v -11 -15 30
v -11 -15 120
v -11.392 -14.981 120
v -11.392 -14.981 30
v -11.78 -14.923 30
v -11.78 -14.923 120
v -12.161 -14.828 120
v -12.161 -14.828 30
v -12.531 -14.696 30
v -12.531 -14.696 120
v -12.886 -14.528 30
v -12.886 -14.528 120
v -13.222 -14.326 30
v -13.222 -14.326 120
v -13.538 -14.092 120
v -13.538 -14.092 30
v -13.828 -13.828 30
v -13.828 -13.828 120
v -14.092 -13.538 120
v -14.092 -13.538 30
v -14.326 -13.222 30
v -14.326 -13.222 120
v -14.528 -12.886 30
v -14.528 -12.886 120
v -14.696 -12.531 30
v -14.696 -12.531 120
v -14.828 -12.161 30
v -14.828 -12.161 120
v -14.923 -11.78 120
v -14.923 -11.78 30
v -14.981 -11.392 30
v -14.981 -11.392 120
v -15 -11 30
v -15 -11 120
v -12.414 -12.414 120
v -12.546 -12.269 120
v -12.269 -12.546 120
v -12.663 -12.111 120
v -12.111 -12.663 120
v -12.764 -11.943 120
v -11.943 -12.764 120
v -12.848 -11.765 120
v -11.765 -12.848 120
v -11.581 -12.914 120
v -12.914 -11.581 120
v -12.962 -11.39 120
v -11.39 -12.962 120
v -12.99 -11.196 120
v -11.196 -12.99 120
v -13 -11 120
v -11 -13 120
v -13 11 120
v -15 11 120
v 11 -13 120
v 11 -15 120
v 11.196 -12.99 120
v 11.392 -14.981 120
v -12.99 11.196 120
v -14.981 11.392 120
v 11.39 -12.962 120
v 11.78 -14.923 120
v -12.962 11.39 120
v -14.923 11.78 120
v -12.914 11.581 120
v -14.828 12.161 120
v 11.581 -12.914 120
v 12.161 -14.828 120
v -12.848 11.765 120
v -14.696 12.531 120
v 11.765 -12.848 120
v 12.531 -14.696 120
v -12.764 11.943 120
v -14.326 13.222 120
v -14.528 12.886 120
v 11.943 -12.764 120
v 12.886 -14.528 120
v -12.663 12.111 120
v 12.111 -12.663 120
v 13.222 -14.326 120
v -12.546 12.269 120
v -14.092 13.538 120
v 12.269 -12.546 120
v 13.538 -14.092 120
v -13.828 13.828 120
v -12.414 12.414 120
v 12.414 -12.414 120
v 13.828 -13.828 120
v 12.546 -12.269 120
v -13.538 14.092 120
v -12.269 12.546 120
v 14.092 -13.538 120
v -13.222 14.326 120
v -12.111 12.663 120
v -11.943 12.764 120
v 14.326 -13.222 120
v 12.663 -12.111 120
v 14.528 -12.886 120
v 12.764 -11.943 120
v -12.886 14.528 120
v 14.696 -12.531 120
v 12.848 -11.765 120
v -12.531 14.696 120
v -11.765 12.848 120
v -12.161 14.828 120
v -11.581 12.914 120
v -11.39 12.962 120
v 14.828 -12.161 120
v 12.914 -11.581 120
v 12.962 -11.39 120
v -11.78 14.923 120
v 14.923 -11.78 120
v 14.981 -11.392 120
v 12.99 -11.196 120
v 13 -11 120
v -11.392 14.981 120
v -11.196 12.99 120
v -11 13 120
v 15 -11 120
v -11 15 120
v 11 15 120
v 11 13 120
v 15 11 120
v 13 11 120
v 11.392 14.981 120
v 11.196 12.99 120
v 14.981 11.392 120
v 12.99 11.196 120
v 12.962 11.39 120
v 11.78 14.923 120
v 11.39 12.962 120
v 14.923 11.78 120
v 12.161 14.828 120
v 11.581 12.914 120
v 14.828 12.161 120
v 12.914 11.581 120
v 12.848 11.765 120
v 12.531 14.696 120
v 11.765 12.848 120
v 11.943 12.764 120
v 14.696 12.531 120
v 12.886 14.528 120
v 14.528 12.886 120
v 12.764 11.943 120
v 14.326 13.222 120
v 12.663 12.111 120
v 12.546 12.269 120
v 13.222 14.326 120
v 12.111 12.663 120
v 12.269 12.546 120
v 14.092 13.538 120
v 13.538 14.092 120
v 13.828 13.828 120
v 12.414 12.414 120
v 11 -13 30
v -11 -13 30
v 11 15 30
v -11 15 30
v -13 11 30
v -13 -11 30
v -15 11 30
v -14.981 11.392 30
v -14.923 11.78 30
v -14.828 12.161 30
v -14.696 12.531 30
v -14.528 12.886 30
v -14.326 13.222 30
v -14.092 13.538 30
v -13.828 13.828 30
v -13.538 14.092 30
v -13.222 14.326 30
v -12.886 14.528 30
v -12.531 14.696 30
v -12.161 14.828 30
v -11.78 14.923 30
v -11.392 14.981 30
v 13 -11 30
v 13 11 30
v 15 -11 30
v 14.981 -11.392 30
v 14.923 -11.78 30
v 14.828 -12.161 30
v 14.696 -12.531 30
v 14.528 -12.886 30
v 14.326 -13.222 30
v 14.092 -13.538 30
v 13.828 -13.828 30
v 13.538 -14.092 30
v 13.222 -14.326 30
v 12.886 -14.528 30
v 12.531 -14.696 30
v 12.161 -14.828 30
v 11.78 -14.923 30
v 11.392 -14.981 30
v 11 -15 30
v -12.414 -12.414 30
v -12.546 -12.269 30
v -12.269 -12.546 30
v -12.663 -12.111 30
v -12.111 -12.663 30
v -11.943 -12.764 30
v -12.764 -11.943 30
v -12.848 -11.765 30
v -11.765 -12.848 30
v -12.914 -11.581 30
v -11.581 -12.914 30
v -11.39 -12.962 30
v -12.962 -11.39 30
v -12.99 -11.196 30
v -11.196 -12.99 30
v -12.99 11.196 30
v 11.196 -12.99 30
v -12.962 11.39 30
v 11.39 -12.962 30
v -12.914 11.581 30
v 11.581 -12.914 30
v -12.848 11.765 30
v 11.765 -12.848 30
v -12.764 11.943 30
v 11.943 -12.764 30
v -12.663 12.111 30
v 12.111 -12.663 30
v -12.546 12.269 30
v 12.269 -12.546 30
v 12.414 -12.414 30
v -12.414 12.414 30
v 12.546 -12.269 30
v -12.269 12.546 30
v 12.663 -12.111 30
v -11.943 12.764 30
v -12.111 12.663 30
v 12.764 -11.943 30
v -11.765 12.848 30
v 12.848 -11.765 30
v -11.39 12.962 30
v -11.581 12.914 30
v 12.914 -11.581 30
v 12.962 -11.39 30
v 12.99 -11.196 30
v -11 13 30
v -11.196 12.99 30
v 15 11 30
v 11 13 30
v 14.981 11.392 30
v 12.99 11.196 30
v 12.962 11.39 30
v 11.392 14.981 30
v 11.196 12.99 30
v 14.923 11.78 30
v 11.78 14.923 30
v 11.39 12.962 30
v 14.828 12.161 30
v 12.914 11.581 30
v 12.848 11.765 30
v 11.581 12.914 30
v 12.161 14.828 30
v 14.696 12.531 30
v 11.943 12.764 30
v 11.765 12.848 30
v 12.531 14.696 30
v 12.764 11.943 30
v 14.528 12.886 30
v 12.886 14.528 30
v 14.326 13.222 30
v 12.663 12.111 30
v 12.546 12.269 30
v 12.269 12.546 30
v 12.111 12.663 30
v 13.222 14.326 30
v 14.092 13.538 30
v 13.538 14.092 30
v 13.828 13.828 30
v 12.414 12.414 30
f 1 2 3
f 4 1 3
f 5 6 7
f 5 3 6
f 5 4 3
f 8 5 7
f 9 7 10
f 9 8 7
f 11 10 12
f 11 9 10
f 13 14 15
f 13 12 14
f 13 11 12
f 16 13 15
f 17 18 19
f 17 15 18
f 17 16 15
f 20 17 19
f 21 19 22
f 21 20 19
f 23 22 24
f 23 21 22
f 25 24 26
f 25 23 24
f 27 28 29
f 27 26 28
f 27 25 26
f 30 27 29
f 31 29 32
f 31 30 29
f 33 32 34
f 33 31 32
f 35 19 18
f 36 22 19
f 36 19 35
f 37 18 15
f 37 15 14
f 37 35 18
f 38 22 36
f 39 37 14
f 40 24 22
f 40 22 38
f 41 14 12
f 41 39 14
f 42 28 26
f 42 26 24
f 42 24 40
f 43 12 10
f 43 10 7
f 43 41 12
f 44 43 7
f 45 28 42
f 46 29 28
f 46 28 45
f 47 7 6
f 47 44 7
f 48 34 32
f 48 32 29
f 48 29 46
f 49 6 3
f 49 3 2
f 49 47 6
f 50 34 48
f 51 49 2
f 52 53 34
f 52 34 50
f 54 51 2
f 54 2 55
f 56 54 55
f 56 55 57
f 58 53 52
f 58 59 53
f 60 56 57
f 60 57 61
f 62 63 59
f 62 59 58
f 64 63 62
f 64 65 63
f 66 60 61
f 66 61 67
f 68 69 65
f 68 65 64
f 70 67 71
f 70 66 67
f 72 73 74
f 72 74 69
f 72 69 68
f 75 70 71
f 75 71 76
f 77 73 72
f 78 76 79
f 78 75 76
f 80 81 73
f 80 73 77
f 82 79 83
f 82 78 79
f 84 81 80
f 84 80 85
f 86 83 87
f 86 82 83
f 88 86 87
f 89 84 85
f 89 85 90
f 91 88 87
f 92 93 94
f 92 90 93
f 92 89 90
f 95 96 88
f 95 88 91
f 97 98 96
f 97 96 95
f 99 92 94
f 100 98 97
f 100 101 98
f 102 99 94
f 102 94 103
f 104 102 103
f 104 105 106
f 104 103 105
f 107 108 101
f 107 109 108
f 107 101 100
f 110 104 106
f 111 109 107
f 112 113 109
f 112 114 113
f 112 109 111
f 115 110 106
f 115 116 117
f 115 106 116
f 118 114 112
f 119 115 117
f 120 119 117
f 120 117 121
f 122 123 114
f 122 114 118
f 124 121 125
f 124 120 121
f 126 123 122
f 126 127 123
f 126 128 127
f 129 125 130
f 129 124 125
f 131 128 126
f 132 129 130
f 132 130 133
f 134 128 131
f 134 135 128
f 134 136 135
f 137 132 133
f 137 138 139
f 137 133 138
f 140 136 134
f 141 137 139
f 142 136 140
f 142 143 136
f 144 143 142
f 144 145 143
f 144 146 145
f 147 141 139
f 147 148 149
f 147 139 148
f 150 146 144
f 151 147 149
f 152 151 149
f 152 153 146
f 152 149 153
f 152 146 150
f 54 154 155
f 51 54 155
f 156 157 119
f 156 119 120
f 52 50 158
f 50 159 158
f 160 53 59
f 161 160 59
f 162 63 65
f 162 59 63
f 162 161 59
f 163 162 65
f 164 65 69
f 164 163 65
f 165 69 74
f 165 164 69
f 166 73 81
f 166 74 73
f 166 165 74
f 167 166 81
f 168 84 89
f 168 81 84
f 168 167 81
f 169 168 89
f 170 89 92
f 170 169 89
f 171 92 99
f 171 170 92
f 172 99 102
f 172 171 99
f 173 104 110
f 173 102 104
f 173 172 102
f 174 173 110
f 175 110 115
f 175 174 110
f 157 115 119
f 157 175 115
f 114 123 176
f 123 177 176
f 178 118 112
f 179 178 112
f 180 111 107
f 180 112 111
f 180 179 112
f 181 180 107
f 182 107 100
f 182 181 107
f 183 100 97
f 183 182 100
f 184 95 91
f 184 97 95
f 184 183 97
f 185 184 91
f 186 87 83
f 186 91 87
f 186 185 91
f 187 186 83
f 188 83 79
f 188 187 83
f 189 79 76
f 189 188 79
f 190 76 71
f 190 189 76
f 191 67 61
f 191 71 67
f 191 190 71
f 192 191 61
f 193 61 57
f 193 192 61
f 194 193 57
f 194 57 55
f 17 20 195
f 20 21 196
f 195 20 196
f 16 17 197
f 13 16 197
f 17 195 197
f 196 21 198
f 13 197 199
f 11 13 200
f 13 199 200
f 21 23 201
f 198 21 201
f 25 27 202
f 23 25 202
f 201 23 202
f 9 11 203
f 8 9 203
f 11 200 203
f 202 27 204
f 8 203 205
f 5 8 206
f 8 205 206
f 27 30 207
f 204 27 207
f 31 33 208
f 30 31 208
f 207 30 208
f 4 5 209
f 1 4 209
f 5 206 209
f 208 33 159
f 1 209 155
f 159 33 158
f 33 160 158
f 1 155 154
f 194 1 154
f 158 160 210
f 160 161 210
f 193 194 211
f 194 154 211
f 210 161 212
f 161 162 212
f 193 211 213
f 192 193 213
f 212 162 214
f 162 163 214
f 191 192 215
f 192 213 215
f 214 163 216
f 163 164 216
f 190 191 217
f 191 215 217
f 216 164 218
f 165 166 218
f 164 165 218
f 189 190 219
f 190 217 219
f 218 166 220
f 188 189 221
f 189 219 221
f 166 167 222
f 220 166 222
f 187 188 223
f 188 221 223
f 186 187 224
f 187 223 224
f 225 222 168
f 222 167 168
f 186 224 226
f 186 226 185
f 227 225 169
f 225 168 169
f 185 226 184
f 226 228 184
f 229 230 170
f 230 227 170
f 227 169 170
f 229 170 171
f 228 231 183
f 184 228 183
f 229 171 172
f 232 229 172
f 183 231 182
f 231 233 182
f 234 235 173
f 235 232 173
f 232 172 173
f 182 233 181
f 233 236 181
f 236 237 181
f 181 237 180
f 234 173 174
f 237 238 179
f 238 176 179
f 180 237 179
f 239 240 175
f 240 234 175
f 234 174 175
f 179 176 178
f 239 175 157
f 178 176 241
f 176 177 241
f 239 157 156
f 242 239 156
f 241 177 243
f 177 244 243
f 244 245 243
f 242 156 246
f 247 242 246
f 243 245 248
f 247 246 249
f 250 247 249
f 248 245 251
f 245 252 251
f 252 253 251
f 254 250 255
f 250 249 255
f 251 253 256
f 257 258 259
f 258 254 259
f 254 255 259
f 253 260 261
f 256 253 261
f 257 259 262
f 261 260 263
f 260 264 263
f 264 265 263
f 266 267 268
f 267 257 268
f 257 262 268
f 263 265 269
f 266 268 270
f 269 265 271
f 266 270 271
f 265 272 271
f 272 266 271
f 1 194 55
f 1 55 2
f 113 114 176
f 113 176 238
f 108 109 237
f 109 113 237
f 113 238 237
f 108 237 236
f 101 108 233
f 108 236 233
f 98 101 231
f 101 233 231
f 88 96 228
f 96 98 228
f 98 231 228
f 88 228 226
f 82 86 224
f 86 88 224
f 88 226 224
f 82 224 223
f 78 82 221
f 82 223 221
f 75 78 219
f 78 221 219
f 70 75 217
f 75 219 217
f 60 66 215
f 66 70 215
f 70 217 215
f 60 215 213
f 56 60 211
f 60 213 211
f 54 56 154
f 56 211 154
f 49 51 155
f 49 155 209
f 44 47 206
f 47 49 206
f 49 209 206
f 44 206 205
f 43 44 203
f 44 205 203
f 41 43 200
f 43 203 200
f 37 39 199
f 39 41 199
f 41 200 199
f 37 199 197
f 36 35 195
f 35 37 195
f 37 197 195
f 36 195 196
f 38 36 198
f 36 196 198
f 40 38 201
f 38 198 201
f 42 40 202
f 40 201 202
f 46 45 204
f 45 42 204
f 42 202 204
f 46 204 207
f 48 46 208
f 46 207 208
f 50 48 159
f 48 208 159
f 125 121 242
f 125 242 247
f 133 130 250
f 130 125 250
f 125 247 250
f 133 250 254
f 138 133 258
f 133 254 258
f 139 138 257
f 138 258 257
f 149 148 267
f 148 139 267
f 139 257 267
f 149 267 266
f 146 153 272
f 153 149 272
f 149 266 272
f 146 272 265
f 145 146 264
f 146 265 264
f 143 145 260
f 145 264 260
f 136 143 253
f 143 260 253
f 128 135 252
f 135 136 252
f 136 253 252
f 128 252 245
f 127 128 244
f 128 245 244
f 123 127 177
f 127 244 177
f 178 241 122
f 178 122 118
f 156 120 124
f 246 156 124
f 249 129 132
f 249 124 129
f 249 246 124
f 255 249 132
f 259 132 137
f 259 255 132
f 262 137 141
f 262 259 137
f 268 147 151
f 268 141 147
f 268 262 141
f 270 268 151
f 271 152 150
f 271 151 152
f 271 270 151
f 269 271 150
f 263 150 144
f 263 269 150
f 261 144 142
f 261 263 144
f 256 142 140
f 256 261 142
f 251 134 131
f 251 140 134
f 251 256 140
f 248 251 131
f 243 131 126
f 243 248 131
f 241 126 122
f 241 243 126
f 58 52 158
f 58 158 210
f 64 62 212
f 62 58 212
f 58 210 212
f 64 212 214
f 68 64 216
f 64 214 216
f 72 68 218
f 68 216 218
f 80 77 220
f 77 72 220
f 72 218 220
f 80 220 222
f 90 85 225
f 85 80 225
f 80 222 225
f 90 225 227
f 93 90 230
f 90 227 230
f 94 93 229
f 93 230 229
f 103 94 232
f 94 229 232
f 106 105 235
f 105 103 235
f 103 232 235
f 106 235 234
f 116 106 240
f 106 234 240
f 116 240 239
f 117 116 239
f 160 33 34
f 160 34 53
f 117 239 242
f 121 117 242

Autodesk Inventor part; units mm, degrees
ref_plane "Plano inicial" through (0, 0, 30) normal (0, 0, 1) x (1, 0, 0)
ref_plane "Plano final" through (0, 0, 120) normal (0, 0, 1) x (1, 0, 0)
sketch "Esboço" plane through (0, 0, 0) normal (0, 0, 1) x (1, 0, 0)
  line L0 (-15, -11) -> (-15, 11)
  line L1 (-11, 15) -> (11, 15)
  line L2 (15, 11) -> (15, -11)
  line L3 (11, -15) -> (-11, -15)
  arc A0 (-15, -11) -> (-11, -15) centre (-11, -11) ccw
  arc A1 (15, 11) -> (11, 15) centre (11, 11) ccw
  arc A2 (-11, 15) -> (-15, 11) centre (-11, 11) ccw
  arc A3 (11, -15) -> (15, -11) centre (11, -11) ccw
  arc A4 (-11, 13) -> (-13, 11) centre (-11, 11) ccw
  line L4 (-11, 13) -> (11, 13)
  arc A5 (13, 11) -> (11, 13) centre (11, 11) ccw
  line L5 (13, 11) -> (13, -11)
  arc A6 (11, -13) -> (13, -11) centre (11, -11) ccw
  line L6 (11, -13) -> (-11, -13)
  arc A7 (-13, -11) -> (-11, -13) centre (-11, -11) ccw
  line L7 (-13, -11) -> (-13, 11)
  line L8 (0, 22.1598) -> (0, -22.1598) construction
  line L9 (-22.1598, 0) -> (22.1598, 0) construction
  dimension "d7" = 4
  dimension "d9" = 30
  dimension "d11" = 30
  dimension "d12" = 2
  dimension "d15" = 15
  dimension "d16" = 15
extrude "Corpo" add sketch "Esboço" along normal up to surface (90 mm away) from surface at 30
sketch "Sketch3" plane through (0, 0, 0) normal (0, 0, 1) x (1, 0, 0)
  line L0 (0, 0) -> (10, 0)
ref_plane "Work Plane3" through (0, 0, 0) normal (0, -1, 0) x (1, 0, 0)
sketch "Sketch4" plane through (0, 0, 0) normal (0, -1, 0) x (1, 0, 0)
  line L0 (-2, 30) -> (12, 30)
  line L1 (-2, 120) -> (12, 120)
  dimension "d18" = 90
ref_plane "Plano de trabalho4" through (0, -15, 30) normal (0, 0, -1) x (-1, 0, 0)
split "Dividir1" plane through (0, -15, 30) removes the side toward (0, 0, -1)
ref_plane "Plano de trabalho5" through (0, 435, 120) normal (0, 0, 1) x (1, 0, 0)
split "Dividir2" plane through (0, 435, 120) removes the side toward (0, 0, 1)
equation "\"d7\" = G_IR"
equation "\"d9\" = G_W"
equation "\"d11\" = G_H"
equation "\"d12\" = G_T"
equation "\"d15\" = 0.5 * d9"
equation "\"d16\" = 0.5 * d11"
equation "\"d3\" = G_L"
equation "\"G_W\" = 30"
equation "\"G_H\" = 30"
equation "\"G_T\" = 2"
equation "\"G_IR\" = 4"
equation "\"G_L\" = d18"
properties part number "ISO 10799-2 - 30x30x2 - 90" material "Aço, suave"
